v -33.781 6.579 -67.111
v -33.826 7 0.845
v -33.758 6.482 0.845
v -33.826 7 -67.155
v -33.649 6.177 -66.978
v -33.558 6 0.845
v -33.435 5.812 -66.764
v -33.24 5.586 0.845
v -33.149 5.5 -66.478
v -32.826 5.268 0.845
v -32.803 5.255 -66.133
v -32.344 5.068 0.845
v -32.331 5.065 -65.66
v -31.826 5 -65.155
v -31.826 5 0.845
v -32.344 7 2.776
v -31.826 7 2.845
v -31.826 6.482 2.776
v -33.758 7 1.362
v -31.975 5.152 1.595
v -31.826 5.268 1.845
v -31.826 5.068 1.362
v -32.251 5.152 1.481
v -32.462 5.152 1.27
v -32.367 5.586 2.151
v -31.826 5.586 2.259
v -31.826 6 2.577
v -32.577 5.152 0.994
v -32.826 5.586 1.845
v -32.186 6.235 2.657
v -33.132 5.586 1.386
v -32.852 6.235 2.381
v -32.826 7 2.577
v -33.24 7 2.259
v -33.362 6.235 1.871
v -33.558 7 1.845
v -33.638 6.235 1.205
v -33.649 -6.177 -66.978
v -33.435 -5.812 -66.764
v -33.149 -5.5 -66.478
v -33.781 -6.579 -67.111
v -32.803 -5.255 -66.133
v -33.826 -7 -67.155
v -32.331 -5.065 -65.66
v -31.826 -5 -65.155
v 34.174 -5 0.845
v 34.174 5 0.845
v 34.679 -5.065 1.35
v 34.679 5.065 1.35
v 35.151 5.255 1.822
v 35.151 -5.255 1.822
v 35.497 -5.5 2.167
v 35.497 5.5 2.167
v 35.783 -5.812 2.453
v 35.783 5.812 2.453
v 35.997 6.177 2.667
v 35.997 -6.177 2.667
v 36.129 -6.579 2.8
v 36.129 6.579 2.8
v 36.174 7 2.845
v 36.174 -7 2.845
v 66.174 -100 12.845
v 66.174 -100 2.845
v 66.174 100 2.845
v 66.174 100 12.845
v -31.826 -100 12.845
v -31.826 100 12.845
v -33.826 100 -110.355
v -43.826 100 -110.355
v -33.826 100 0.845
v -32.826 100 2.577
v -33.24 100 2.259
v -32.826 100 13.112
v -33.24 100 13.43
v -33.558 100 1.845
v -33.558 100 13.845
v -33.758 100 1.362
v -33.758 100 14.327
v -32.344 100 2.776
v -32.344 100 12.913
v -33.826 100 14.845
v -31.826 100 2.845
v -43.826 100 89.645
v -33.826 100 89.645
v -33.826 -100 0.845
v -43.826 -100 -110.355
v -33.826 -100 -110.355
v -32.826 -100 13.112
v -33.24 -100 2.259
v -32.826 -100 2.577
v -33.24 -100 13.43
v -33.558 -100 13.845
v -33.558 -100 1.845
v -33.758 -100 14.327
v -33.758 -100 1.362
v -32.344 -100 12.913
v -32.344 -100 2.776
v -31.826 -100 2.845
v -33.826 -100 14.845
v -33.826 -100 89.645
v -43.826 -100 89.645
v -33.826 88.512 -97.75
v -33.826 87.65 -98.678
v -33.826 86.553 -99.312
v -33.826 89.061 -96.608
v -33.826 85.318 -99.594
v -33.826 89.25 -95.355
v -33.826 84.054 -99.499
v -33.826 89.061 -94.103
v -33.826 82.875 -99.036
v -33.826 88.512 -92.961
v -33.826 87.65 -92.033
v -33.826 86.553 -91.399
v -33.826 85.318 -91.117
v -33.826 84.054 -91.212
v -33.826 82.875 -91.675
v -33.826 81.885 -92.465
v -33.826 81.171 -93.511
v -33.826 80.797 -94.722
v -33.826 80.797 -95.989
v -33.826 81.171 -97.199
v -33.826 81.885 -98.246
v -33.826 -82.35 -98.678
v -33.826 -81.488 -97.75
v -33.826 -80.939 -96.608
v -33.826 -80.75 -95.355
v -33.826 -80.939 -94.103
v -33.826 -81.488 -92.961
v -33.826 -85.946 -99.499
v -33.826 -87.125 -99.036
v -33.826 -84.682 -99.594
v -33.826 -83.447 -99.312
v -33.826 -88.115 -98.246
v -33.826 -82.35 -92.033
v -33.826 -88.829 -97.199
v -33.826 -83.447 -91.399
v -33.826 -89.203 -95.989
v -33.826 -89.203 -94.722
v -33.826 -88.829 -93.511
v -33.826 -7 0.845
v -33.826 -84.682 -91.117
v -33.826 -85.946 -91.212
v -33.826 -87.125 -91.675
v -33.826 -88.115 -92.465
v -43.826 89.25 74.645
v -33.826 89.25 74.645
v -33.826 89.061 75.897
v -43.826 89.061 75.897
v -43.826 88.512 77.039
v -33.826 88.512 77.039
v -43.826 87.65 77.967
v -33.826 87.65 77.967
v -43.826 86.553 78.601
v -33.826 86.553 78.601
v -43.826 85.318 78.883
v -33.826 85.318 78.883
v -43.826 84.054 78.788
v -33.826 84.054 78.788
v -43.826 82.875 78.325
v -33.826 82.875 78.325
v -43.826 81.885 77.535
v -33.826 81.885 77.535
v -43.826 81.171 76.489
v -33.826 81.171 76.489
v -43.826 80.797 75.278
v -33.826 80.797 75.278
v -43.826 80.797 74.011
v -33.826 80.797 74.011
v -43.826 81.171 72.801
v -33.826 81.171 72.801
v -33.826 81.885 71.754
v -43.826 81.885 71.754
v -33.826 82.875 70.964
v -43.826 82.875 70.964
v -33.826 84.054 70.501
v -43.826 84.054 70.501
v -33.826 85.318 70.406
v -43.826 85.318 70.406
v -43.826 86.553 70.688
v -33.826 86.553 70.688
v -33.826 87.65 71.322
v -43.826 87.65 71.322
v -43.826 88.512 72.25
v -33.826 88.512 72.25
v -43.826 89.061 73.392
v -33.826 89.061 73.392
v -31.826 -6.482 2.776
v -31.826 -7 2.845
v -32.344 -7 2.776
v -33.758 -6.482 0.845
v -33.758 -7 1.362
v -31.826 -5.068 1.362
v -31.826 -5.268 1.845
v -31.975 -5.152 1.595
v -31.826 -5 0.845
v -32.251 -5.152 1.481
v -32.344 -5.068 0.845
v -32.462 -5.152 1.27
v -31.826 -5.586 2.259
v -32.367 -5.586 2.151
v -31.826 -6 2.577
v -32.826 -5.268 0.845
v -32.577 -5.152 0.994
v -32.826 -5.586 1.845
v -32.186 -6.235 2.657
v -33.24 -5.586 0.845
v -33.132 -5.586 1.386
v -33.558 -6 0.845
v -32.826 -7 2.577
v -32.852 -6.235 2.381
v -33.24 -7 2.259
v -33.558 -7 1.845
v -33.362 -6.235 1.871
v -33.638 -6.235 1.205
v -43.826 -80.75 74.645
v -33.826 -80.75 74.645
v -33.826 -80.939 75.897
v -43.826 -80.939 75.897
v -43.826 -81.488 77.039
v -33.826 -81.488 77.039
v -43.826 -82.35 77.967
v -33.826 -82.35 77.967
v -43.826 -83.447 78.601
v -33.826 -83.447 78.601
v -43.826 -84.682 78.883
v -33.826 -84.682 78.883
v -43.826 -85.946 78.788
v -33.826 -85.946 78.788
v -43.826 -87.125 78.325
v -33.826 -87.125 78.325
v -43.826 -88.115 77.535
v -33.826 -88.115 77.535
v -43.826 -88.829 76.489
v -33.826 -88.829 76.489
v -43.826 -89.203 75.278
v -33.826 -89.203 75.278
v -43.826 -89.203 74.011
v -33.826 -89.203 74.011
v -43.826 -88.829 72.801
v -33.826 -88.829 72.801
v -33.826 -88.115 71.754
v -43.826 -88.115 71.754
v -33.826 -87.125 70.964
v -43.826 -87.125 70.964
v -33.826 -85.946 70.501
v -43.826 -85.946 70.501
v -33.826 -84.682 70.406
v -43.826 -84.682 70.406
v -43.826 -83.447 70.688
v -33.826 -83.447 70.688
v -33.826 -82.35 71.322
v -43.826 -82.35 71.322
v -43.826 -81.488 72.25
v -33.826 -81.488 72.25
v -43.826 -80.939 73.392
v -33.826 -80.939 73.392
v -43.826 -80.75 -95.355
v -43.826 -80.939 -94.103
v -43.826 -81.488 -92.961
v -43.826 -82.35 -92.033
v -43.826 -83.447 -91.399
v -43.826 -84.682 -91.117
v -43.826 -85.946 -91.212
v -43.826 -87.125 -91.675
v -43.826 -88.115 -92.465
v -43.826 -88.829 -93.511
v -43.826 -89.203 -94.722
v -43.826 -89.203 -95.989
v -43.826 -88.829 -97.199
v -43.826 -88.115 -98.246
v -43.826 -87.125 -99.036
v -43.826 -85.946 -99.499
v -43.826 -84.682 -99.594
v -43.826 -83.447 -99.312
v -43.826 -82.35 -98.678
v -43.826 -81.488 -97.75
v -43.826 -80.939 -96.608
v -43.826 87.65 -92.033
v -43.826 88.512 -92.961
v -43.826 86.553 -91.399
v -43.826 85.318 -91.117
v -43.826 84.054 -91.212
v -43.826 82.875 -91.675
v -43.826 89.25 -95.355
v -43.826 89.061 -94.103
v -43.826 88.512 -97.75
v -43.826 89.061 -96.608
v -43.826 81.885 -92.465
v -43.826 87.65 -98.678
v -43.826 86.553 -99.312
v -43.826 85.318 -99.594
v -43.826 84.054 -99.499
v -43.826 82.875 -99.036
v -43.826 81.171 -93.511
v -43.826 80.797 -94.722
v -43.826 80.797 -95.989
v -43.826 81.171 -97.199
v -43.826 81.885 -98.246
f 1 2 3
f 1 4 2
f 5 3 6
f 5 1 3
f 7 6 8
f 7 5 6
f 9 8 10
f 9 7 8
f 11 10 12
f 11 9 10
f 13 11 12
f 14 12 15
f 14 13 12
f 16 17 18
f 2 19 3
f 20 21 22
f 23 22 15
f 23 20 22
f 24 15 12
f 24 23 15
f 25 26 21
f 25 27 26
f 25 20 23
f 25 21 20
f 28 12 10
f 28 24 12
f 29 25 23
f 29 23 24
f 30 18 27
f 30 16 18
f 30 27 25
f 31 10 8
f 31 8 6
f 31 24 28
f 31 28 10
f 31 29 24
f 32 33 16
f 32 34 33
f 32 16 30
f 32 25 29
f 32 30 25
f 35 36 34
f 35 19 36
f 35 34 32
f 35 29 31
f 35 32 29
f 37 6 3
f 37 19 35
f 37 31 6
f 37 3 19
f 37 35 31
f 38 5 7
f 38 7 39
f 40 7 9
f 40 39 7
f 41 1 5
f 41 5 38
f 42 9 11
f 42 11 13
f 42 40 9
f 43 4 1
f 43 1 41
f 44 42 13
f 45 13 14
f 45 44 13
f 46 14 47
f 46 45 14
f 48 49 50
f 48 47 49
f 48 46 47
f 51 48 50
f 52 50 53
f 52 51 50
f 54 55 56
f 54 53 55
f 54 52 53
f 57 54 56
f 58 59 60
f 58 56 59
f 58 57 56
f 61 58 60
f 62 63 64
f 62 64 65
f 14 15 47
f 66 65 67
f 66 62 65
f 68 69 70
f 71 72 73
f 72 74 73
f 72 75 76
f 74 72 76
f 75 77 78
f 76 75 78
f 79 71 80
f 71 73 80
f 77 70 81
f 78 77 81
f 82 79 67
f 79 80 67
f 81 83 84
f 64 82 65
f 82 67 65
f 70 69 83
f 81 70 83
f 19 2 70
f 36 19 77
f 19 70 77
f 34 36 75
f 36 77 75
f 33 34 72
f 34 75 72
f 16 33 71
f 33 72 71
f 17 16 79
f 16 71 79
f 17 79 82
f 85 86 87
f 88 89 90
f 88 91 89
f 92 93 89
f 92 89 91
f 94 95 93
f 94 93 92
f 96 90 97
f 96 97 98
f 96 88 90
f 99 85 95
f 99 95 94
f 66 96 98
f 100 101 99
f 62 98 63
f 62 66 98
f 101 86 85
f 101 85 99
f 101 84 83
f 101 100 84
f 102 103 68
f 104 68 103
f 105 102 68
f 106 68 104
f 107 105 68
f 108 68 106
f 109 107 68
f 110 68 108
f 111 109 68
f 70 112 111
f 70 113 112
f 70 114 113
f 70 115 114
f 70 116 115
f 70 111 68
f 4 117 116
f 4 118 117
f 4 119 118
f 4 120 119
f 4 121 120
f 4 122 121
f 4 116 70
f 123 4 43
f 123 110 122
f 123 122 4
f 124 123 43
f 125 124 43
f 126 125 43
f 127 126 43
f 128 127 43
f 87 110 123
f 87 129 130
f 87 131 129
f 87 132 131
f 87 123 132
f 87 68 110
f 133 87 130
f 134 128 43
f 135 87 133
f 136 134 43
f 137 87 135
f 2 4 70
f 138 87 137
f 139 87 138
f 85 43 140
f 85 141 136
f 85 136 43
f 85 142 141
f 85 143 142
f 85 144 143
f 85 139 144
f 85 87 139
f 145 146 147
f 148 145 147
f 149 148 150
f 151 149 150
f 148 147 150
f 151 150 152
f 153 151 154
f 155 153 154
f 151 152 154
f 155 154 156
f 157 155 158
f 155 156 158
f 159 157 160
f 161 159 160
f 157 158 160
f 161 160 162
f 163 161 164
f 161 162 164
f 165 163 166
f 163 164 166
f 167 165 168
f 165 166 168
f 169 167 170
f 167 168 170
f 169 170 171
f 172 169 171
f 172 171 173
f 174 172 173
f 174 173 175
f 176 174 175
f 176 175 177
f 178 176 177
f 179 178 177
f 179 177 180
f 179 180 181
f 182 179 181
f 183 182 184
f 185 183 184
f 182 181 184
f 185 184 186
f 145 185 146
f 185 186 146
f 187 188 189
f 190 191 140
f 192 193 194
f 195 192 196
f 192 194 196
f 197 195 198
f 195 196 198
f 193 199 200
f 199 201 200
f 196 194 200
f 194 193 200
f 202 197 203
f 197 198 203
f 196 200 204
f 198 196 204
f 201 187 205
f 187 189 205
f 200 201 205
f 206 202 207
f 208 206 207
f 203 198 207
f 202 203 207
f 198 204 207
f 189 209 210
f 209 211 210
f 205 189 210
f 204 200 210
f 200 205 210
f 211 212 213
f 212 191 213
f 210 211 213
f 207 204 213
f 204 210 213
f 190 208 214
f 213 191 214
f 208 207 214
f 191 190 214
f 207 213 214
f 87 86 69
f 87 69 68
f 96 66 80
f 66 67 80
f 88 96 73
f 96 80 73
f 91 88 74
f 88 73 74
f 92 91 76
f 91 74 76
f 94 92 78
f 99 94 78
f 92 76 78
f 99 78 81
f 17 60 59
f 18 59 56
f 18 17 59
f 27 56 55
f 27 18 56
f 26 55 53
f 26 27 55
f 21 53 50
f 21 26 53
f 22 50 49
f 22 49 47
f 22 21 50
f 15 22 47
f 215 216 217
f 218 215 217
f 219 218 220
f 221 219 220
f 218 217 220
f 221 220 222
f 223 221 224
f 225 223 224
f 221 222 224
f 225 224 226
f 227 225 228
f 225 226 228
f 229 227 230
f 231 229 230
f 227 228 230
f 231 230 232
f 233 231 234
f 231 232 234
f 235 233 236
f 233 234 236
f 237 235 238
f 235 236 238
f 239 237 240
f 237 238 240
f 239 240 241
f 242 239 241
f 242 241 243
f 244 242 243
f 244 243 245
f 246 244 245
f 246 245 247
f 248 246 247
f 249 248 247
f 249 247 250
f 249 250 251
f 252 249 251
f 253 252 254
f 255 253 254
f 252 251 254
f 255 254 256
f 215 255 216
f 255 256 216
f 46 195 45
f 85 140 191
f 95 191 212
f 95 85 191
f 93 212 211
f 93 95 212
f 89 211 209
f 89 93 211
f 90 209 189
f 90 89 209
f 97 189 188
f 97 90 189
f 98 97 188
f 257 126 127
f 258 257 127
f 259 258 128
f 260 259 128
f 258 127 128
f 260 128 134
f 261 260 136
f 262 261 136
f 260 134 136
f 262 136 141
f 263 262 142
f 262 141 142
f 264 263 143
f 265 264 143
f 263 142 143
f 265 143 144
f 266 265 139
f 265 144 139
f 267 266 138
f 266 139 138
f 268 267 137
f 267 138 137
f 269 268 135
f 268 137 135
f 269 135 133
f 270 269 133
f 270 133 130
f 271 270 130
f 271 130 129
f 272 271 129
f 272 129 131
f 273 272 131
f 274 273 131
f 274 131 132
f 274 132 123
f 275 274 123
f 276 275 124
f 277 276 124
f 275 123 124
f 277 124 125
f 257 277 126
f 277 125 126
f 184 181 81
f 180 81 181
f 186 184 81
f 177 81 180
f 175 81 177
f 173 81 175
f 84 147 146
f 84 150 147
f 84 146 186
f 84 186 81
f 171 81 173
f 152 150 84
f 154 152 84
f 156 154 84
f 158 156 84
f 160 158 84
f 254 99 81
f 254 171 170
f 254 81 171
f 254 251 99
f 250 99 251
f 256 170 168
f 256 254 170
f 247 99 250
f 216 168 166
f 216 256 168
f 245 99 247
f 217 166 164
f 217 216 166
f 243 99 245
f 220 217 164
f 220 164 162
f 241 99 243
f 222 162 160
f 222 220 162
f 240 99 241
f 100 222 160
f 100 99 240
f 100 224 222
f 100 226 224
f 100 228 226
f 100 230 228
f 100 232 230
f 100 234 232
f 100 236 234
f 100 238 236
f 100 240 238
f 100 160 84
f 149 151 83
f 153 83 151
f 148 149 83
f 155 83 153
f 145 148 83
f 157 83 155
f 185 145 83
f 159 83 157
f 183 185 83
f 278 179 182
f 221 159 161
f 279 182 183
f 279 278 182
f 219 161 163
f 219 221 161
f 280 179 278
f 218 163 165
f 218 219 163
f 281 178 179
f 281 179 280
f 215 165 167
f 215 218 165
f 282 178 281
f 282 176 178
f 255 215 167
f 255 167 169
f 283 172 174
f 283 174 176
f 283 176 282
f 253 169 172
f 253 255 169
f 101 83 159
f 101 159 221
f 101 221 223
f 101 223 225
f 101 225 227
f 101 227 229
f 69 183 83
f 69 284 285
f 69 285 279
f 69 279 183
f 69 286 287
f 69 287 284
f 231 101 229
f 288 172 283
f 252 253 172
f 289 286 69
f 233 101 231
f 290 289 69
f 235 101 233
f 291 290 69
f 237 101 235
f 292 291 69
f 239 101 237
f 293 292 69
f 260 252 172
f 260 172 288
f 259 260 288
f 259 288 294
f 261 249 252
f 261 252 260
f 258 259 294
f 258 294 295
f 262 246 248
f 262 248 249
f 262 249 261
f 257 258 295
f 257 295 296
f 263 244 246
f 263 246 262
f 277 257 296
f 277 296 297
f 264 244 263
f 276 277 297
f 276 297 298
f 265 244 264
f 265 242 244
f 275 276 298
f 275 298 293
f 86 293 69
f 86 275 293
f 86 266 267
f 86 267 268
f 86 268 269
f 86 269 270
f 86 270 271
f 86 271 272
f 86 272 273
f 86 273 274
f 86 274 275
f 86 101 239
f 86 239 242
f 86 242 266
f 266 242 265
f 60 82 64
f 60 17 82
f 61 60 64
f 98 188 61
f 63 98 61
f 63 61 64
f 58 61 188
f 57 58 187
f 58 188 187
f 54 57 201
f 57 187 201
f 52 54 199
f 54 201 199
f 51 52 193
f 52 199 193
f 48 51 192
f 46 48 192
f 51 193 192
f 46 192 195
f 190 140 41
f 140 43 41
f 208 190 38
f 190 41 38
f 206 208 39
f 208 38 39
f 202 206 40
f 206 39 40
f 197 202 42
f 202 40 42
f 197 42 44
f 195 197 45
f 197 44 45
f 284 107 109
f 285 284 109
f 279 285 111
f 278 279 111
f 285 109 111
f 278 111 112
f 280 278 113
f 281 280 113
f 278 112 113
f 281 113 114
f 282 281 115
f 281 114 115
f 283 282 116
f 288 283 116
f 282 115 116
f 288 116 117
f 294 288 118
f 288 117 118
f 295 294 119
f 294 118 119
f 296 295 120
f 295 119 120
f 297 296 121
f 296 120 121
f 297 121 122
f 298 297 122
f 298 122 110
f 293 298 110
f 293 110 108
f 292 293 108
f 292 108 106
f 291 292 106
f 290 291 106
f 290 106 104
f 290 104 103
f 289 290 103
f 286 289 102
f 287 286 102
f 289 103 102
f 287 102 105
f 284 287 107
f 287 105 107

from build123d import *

# Parameters (mm, degrees)
F1_DEPTH = 5
F2_DEPTH = 5
F3_DEPTH = 100
F4_DEPTH = 100
F5_R     = 4.25
F6_DEPTH = 10
F7_R     = 2


with BuildPart() as f1:
    # F0 (on Front) → F1 (new body)
    with BuildSketch(Plane.XZ):
        Polygon((-33.825879693, 2.8445311606), (-33.825879693, -67.1554688394), (36.174120307, 2.8445311606), align=None)
    extrude(amount=F1_DEPTH)

    # F0 (on Front) → F2 (join)
    with BuildSketch(Plane.XZ):
        Polygon((-33.825879693, 2.8445311606), (-33.825879693, -67.1554688394), (36.174120307, 2.8445311606), align=None)
    extrude(amount=-F2_DEPTH)

    # F0 (on Front) → F3 (join)
    with BuildSketch(Plane.XZ):
        Polygon((-43.825879693, 89.6445311606), (-43.825879693, -110.3554688394), (-33.825879693, -110.3554688394), (-33.825879693, -67.1554688394), (-33.825879693, 2.8445311606), (36.174120307, 2.8445311606), (66.174120307, 2.8445311606), (66.174120307, 12.8445311606), (-33.825879693, 12.8445311606), (-33.825879693, 89.6445311606), align=None)
    extrude(amount=F3_DEPTH)

    # F4 (add): a face of the model
    f4_faces = [f1.faces().sort_by_distance(p)[0] for p in [
        (-41.5433372509, 0, -10.3554688394),
    ]]
    extrude(f4_faces, amount=F4_DEPTH)

    # F5 (on face) → F6 (cut)
    with BuildSketch(Plane.YZ.offset(-33.825879693)):
        with Locations((-85, -95.3554688394)):
            Circle(F5_R)
        with Locations((85, -95.3554688394)):
            Circle(F5_R)
        with Locations((85, 74.6445311606)):
            Circle(F5_R)
        with Locations((-85, 74.6445311606)):
            Circle(F5_R)
    extrude(amount=-F6_DEPTH, mode=Mode.SUBTRACT)

    # F7
    f7_edges = [f1.edges().sort_by_distance(p)[0] for p in [
        (-33.82588, -52.5, 2.844531),
        (-33.82588, 52.5, 2.844531),
        (1.17412, 5, 2.844531),
        (-33.82588, 5, -32.155469),
        (1.17412, -5, 2.844531),
        (-33.82588, -5, -32.155469),
        (-33.82588, 0, 12.844531),
    ]]
    fillet(f7_edges, radius=F7_R)


solid = f1.part
